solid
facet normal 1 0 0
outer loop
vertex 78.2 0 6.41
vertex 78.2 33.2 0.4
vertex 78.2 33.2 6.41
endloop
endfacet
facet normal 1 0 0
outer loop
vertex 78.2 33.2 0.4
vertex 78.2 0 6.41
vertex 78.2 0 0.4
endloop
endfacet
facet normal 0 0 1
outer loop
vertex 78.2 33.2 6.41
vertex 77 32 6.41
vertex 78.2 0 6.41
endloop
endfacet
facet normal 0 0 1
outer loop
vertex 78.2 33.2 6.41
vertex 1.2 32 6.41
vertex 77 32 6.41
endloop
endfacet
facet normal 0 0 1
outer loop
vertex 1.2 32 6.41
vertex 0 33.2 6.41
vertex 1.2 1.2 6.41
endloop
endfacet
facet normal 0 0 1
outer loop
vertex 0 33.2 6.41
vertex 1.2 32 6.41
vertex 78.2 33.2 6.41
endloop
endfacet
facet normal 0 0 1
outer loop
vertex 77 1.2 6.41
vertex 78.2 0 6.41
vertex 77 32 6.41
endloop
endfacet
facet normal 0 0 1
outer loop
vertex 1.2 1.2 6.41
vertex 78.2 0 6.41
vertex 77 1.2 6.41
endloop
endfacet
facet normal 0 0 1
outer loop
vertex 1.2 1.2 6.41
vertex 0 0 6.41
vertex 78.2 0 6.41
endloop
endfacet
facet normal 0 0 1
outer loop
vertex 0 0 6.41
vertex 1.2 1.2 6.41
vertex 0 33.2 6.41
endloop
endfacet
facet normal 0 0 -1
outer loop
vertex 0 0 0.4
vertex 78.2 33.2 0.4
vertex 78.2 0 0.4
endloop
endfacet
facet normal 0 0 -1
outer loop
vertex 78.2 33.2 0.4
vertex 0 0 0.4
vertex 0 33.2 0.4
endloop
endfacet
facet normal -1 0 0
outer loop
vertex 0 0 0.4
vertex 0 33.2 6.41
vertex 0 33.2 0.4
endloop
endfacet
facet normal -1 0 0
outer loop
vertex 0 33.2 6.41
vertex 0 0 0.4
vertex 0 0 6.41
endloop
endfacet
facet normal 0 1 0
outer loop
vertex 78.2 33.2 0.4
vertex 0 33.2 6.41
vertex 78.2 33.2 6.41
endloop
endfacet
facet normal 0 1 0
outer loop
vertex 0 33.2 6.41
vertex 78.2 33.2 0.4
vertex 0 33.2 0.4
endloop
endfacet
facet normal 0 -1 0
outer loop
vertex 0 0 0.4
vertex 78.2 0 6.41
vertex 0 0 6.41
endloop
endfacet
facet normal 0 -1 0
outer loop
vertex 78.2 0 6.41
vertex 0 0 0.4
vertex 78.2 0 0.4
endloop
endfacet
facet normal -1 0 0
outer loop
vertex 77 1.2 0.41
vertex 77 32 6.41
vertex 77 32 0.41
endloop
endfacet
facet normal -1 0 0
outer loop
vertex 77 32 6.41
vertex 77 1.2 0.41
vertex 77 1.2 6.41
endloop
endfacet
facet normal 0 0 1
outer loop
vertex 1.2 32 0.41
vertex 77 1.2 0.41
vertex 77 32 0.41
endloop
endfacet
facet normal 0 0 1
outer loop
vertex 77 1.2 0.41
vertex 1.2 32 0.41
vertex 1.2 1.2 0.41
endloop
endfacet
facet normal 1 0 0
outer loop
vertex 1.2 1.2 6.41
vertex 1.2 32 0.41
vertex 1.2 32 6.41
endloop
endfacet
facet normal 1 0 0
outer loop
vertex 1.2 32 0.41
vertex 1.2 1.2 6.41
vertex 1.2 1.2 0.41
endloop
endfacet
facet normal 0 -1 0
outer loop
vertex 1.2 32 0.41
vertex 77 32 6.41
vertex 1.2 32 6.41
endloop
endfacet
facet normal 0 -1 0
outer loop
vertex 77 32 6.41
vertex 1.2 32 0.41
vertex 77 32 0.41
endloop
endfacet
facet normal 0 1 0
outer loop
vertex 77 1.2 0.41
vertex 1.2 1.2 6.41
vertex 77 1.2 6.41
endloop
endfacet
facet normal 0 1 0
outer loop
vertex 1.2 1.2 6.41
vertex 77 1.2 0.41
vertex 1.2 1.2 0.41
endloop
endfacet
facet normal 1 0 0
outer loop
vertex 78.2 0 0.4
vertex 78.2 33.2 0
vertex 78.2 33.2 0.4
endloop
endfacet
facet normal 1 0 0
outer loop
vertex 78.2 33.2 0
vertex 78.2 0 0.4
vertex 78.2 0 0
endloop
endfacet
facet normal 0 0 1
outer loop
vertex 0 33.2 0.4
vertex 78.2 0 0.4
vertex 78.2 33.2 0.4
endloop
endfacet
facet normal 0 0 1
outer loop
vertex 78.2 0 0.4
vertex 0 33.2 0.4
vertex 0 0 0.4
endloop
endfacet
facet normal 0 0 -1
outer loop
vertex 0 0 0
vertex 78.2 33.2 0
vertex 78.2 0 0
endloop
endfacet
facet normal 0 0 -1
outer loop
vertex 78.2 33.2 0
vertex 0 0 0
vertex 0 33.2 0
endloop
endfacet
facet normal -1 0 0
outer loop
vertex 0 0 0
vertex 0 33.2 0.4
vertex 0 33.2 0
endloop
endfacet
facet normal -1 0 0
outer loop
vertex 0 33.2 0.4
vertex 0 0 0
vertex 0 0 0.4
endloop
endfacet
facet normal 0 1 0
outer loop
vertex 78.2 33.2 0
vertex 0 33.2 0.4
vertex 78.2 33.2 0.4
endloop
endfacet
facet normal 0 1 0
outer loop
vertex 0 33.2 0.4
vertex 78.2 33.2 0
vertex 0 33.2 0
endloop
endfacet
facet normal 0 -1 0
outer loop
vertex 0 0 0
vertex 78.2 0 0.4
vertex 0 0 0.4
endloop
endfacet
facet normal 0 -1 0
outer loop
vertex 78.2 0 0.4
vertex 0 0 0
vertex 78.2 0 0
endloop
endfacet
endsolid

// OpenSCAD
// file: ../../Base/Rotation.scad
// Fischertechnik Box Foundation
// Geometry Helpers Rotation

include <PlacementOptions.scad>

// getRotatedSpace(space, rotation=NoRotation)
// Rotates the space dependent on the specified rotation

function getRotatedSpace(space, rotation=NoRotation) = [
    (rotation == Rotate90 || rotation == Rotate270) ? space.y : space.x,
    (rotation == Rotate90 || rotation == Rotate270) ? space.x : space.y
];

// Rotates the given space around the fixed left lower corner
// space = the space the children needs as width/depth list [width,depth]
// rotation = 0 Rotate0 degrees, 1 Rotate90 degrees, 2 Rotate180 degrees, 3 Rotate270 degrees (equivalent to -90)

module RotateFix(space, rotation=NoRotation) {
    dy = (rotation == Rotate0 || rotation == Rotate270) ? 0 :
        (rotation == Rotate90) ? space.x :
        space.y;
    dx = (rotation < Rotate180) ? 0 :
        (rotation == Rotate180) ? space.x :
        space.y;
    
    translate([dx, dy, 0])
        rotate([0, 0, rotations[rotation]])
            children();
}
// file: ../../Base/Alignment.scad
// Fischertechnik Box Foundation
// Geometry Helpers Alignment

include <PlacementOptions.scad>

// getAlignedX(elementWidth, spaceWidth, align=AlignRight, offset=0)
// Gets the aligned X offset of an element with the given
// width in the given space.
// elementWidth = The width of the element to positon
// spaceWidth = The space where the element should be aligned
// align = 0 AlignLeft, 1 AlignCenter, 2 AlignRight
// offset = an optional offset from the aligned position. When
// aligned left or centered, then positive values are in X direction.
// When aligned right then positive values are in negative X direction.

function getAlignedX(elementWidth, spaceWidth, align=AlignRight, offset=0) =
    (align == AlignLeft) ?
        offset :
        ((align == AlignCenter) ?
        (spaceWidth - elementWidth)/2 + offset :
        spaceWidth - offset - elementWidth);

// getAlignedY(elementDepth, spaceDepth, align=AlignTop, offset=0)
// Gets the aligned Y offset of an element with the given
// depth in the given space.
// elementDepth = The depth of the element to positon
// spaceDepth = The space where the element should be aligned
// align = 0 AlignBottom, 1 AlignCenter, 2 AlignTop
// offset = an optional offset from the aligned position. When
// aligned bottom or centered, then positive values are in Y direction.
// When aligned top then positive values are in negative Y direction.

function getAlignedY(elementDepth, spaceDepth, align=AlignTop, offset=0) =
    (align == AlignBottom) ?
        offset :
        ((align == AlignCenter) ?
        (spaceDepth - elementDepth)/2 + offset :
        spaceDepth - offset - elementDepth);
// file: ../../Base/PlacementOptions.scad
// Fischertechnik Box Foundation
// Placement Options

// Alignment
NoAlign = 0;
AlignLeft = 1;
AlignBottom = 2;
AlignCenter = 3;
AlignRight = 4;
AlignTop = 5;

// Element rotation degree steps
rotations = [0, -90, -180, -270];

// Rotation
NoRotation = 0;
Rotate0 = 0;
Rotate90 = 1;
Rotate180 = 2;
Rotate270 = 3;

// Docking (seen from above)
NoDock = -1;
DockLeft = 0;
DockTop = 1;
DockRight = 2;
DockCorner = 2;
DockBottom = 3;

// Web corners
LowerLeft = 0;
UpperLeft = 1;
UpperRight = 2;
LowerRight = 3;

// Web position relative to corner
LeftOfCorner = 0;
RightOfCorner = 1;

// Rails direction
Horizontal = true;
Vertical = false;
// file: ../../Base/Boxes.scad
// Fischertechnik Box Foundation
// Pre-designed Boxes

use <Constants.scad>

include <PlacementOptions.scad>

box190Width = 190;
box190Depth = 130;
box130Width = 130;
box130Depth = 95;

// Values are from an original ec3 box
topBottomDifference = 1.5;
outerHeight = 40;
baseThickness = 1.8;
innerHeight = outerHeight - baseThickness;
stackExcess = 5.7;
radius = 3.5;
wallThickness = 1.5;
tolerance = 0.2;

boxWallThickness = wallThickness;
boxBaseThickness = baseThickness;
boxWebWidth = 3.0;

// getBoxWallThickness()
// Gets the wall thickness of a Fischertechnik Box
function getBoxWallThickness() = boxWallThickness;

// getBoxUsageHeight(height = 38.2)
// Gets the usable height of a Fischertechnik box
// height = Outer height of the box from the bottom to the upper edge.
function getBoxUsageHeight(height = outerHeight) = height - baseThickness - stackExcess;

// getBoxInnerHeight()
// Gets the inner height of a Fischertechnik box, including the stack excess
function getBoxInnerHeight() = innerHeight;

// getBoxBaseThickness()
// Gets the thickness of the Fischertechnik box base.
function getBoxBaseThickness() = boxBaseThickness;

// getBoxWebWidth()
// Gets the width of a box web
function getBoxWebWidth() = boxWebWidth;

// getBox190Space()
// Gets the usable inner space of a Box 190 as an x/y-list
function getBox190Space() = [
    box190Width - 2*getBoxWallThickness() - topBottomDifference, 
    box190Depth - 2*getBoxWallThickness() - topBottomDifference ];

// RoundedCornerPlate(width, depth, height, radius)
// Creates a body plate with rounded corners for a box. Used
// also to create the complete box with the hull module.
// width = Width of the plate
// depth = depth of the plate 
// height = thickness of the plate
// radius = radius of the rounded corner
module RoundedCornerPlate(width, depth, height, radius) {
    translate([radius, radius])
    hull() {
        w = width-2*radius;
        d = depth-2*radius;
        cube([w, d, height]);
        cylinder(height, r=radius, $fn=getFragments());
        translate([w, 0])
            cylinder(height, r=radius, $fn=getFragments());
        translate([w, d])
            cylinder(height, r=radius, $fn=getFragments());
        translate([0, d])
            cylinder(height, r=radius, $fn=getFragments());
    }
}

// BoxBase(width, depth)
// Creates an empty stackable Fischertechnik compatible box
// width = Outer width of the box (190, 130, ...)
// depth = Outer depth of the box (130, 95, ...)

module BoxBase(width, depth, height=outerHeight) {    
    thinPlate = 0.01;

    innerHeight = height - baseThickness;    
    
    module Body(tolerance=tolerance) {
        hull() {
            // Bottom with tolerance to fit into the original boxes when stacked
            translate([-wallThickness+tolerance, -wallThickness+tolerance, -baseThickness])
                RoundedCornerPlate(width-topBottomDifference-2*tolerance, depth-topBottomDifference-2*tolerance, thinPlate, radius);
            
            // Top
            translate([-wallThickness-topBottomDifference/2, -wallThickness-topBottomDifference/2, innerHeight-thinPlate])
                RoundedCornerPlate(width, depth, thinPlate, radius);
         }
    }

    module Cutoff() {
        hull() {
            coWidth = width - 2*wallThickness;
            coDepth = depth - 2*wallThickness;
            
            // Bottom
            RoundedCornerPlate(coWidth-topBottomDifference, coDepth-topBottomDifference, thinPlate, radius);

            // Top
            translate([-topBottomDifference/2, -topBottomDifference/2, innerHeight+thinPlate]) 
                RoundedCornerPlate(coWidth, coDepth, thinPlate, radius);
        }
    }
    
    difference() {        
        Body();
        Cutoff();
        stackOffset = innerHeight - stackExcess;
        translate([0, 0, stackOffset + baseThickness])
            Body(tolerance=0);
    }
}

// Creates the Fischertechnik empty box 130x190 mm and places it at position 0,0
// 190x130 are the outer sizes, the inner space is slightly smaller. Use getBox190Space() to get the inner sizes.
// The box is positioned that the usable inner space is at the 0,0,0 position.

module Box190() {
    BoxBase(box190Width, box190Depth);
}

// Gets the usable inner space of a Box 130 as an x/y-list
function getBox130Space() = [
    box130Width - 2*getBoxWallThickness() - topBottomDifference, 
    box130Depth - 2*getBoxWallThickness() - topBottomDifference ];

// Creates the Fischertechnik empty box 95x130 mm and places it at position 0,0
// 190x130 are the outer sizes, the inner space is slightly smaller. Use getBox190Space() to get the inner sizes.
// The box is positioned that the usable inner space is at the 0,0,0 position.

module Box130() {
    BoxBase(box130Width, box130Depth);
}

// Creates a web at the specified box walls
// corner 0 = LowerLeft, 1 = UpperLeft, 2 = UpperRight, 3 = LowerRight
// side 0 = LeftOfCorner, 1 = RightOfCorner
// distance = Distance in mm from the corner
// boxSpace = inner width and depth of the box (default: Box 190)
// webWidth = length of the web (default is 3 mms)
// webThickness = thickness of the web (default is 1 mm)
// height = Height of the web (standard is getBoxUsageHeight())
// sink = How much of the web is sunk into the wall

module BoxWeb(
    corner, 
    side, 
    distance, 
    boxSpace=getBox190Space(), 
    webWidth=getBoxWebWidth(), 
    webThickness=1.0, 
    height=getBoxUsageHeight(),
    sink = getBoxWallThickness()/2) {
    width = (corner % 2 == 0) ? 
            (side == LeftOfCorner ? webWidth : webThickness) :
            (side == LeftOfCorner ? webThickness : webWidth);

    depth = (corner % 2 == 0) ? 
            (side == RightOfCorner ? webWidth : webThickness) :
            (side == RightOfCorner ? webThickness : webWidth);
    
    xDiff = corner == LowerLeft ? 
                (side == LeftOfCorner ? -sink : distance) :
            (corner == UpperLeft ?                
                (side == LeftOfCorner ? distance : -sink) :
            (corner == UpperRight ?
                (side == LeftOfCorner ? boxSpace.x-webWidth+sink : boxSpace.x-distance-webThickness) :
                (side == LeftOfCorner ? boxSpace.x-distance-webThickness: boxSpace.x-webWidth+sink)));

    yDiff = corner == LowerLeft ? 
                (side == RightOfCorner ? -sink : distance) :
            (corner == UpperLeft ?
                (side == RightOfCorner ? boxSpace.y-distance-webThickness : boxSpace.y-webWidth+sink) :
            (corner == UpperRight ?
                (side == RightOfCorner ? boxSpace.y-webWidth+sink : boxSpace.y-distance-webThickness) :
                (side == RightOfCorner ? distance : -sink)));
    
    translate([xDiff, yDiff, -getExcess()])
        cube([width, depth, height + 2*getExcess()]);
}
// file: ../../Base/Placement.scad
// Fischertechnik Box Foundation
// Geometry Helpers Placement

use <Constants.scad>
use <Alignment.scad>
use <Rotation.scad>
use <Boxes.scad>

include <PlacementOptions.scad>

// Place(x=0, y=0, elementSpace=[0,0], alignX=AlignLeft, alignY=AlignBottom, rotation=Rotate0, boxSpace=getBox190Space())
// Places the child at the specified position
// y = Y-Position. This is a relative position when an X aligment is specified.
// x = X-Position. This is a relative position when an Y aligment is specified.
// elementSpace = space of the element to be placed [x,y]
// alignX = -1=NoAlign, 0 AlignLeft, 1 AlignCenter, 3 AlignRight (elementSpace and boxSpace required!)
// alignY = -1=NoAlign, 2 AlignBottom, 1 AlignCenter, 4 AlignTop (elementSpace and boxSpace required!)
// rotation = 0 Rotate0 0 degrees, 1 Rotate90 90 degrees, 
// 2 Rotate180 180 degrees, 3 Rotate270 270 degrees (equivalent to -90)
// boxSpace = Inner space of the box where the placement occurs [x,y] - default is Box 190x130 inner space

module Place(x=0, y=0, elementSpace=[0,0], 
  alignX=AlignLeft, alignY=AlignBottom, 
  rotation=NoRotation, boxSpace=getBox190Space()) {

    module Position(x, y, space, rotation=Rotate0) {
        translate([x, y, 0])
            RotateFix(space, rotation)
                children();
    }

    space = getRotatedSpace(elementSpace, rotation);
    alignedX = getAlignedX(space.x, boxSpace.x, alignX, x);
    alignedY = getAlignedY(space.y, boxSpace.y, alignY, y);
    Position(alignedX, alignedY, elementSpace, rotation)
        children();
}

// Center(space=getBox130Space(), elementSpace=[0,0])
// space = Space where the children is centered. For cylinder use centered=true and no elementSpace.
// elementSpace = space of the element to be centered [x,y]

module Center(space=getBox190Space(), elementSpace=[0,0]) {
    Place(elementSpace=elementSpace, boxSpace=space, alignX=AlignCenter, alignY=AlignCenter)
        children();
}

// CenterHorizontal(width=0, y=0, offset=0, space=getBox130Space())
// width = Width of the element to be placed.
// y = Y position of the element
// offset = Offset from the center position (negative will be left of the center)
// space = Space where the element is placed

module CenterHorizontal(width=0, y=0, offset=0, space=getBox190Space()) {
    Place(x=offset, y=y, elementSpace=[width, 0], boxSpace=space, alignX=AlignCenter)
        children(0);
}

// CenterVertical(depth=0, x=0, offset=0, space=getBox130Space())
// depth = Depth of the element to be placed.
// x = X position of the element
// offset = Offset from the center position (negative will be down of the center)
// space = Space where the element is placed

module CenterVertical(depth=0, x=0, offset=0, space=getBox190Space()) {
    Place(x=x, y=offset, elementSpace=[0, depth], boxSpace=space, alignY=AlignCenter)
        children(0);
}

// getIsVertical(align)
// True if the specified alignment needs a vertical orientation for a divider (AlignRight, AlignLeft)

function getIsVertical(align) = (align == AlignRight || align == AlignLeft);

// getIsHorizontal(align)
// True if the specified alignment needs a horizontal orientation for a divider (AlignTop, AlignBottom)

function getIsHorizontal(align) = (align == AlignTop || align == AlignBottom);
// file: ../../Elements/AxisClip10.scad
// Fischertechnik Box Library
// Axis for clip 10
// 31023

use <../ModelBase/Simple.scad>
use <../Base/Constants.scad>

/* [Element Parameters] */
height = 23;
clipHeight = 10;

/* [Hidden] */
width = 12;
depth = 12;
upperDiameter = 3.6;

// getAxisClip10Space()
// Gets the space of a n axis for a clip 10 with spring ring (mot2)

function getAxisClip10Space() = [width, depth, height];

// AxisClip10(height, clipHeight)
// Axis for clip 10 with spring ring (mot2)
// height = Height of the complete axis (standard is 23, in mot3 its only 12)
// clipHeight = Height of the part for the clip (standard is 10, in mot3 its only 7)

module AxisClip10(height=height, clipHeight=clipHeight) {
    LeveledAxisWithSpace(height, height-clipHeight, getAxisClip10Space(), diameter=upperDiameter);
}

// Test
color("lightgray")
AxisClip10(height, clipHeight);
// file: ../../Base/Constants.scad
// Fischertechnik Box Foundation
// Constants

// Constant values necessary for multiple elements

// Base constants
dividerThickness = 1.2;
excess = 0.01;
fragments = 90;
tolerance = 0.8;

// Gets the thickness of a divider 
function getDividerThickness() = dividerThickness;

// Gets the excess that is used to merge walls into each other
function getExcess() = excess;

// Gets amount of fragments of a cylinder
function getFragments() = fragments;

// Gets the inner tolerance of a frame to each side
function getTolerance() = tolerance;


// Fischertechnik specific constants
axisDiameter = 4;
axisBottomDiameter = axisDiameter + 1;
axisTolerance = 0.2;

// Gets axis diameter of Fischertechnik axis
function getAxisDiameter() = axisDiameter;

// Gets axis diameter tolerance (subtracted for element axis)
function getAxisTolerance() = axisTolerance;

// Gets the axis diameter for standing axis
function getStandAxisDiameter() = getAxisDiameter() - getAxisTolerance();

// Gets axis bottom diameter for thicker part at the bottom
function getAxisBottomDiameter() = axisBottomDiameter;

pinHeight = 2.5;
pinTolerance = 0.2;

// gets the height of a connecting pin
function getPinHeight() = pinHeight;

// gets the connecting pin height tolerance
function getPinTolerance() = pinTolerance;

standardEdgeDistance = 2.5;
standardWebDistance = 11.5;
standardCornerLength = 15;

// gets the standard distance to the wall of the box for dockable frames with webs
function getStandardEdgeDistance() = standardEdgeDistance;

// gets the standard distance of each web to the corner of the dockable frame
function getStandardWebDistance() = standardWebDistance;

// gets the standard length of the corner walls of a dockable frame
function getStandardCornerLength() = standardCornerLength;

tubeWallFactor = 0.8;

// gets the wall thickness of a tube.
function getTubeWallThickness() = tubeWallFactor * getDividerThickness();

smallPartsFrameHeight = 20;

// gets the frame height for docked small parts boxes.
function getSmallPartsFrameHeight() = smallPartsFrameHeight;

hubRingDiameter = 19.5;
hubRingLevelDiameter = 21;

// gets the diameter of a tube matching the inner ring of a wheel
function getHubRingDiameter() = hubRingDiameter;

// gets the diameter of a hub tube with a thicker diameter
function getHubRingLevelDiameter() = hubRingLevelDiameter;
// file: ../../Elements/Frame9VBatterySet.scad
// Fischertechnik Box Library
// Frame for 9V block battery set with switch
// 135719

use <../ModelBase/Simple.scad>

/* [Hidden] */
width = 75;
depth = 30;
height = 6;
volume = [width, depth, height];

// getFrame9VBatterySetSpace(columns=1, rows=1)
// Gets the space of a frame for columns x rows small parts (7.5 or 5)

function getFrame9VBatterySetSpace() = getFrameOuterVolume(volume);

// Frame9VBatterySet()
// Frame for 9V block battery set with switch

module Frame9VBatterySet() {
    Frame(volume);
}

// Tests
color("lightgray")
Frame9VBatterySet();
// file: ../TestPrint.scad
// 3D Print Test Base

use <../Base/Constants.scad>

use <../Elements/AxisClip10.scad>

module TestPrint(elementSpace) {
    cube([elementSpace.x, elementSpace.y, 0.4]);
    translate([0,0,0.4+getExcess()]) {
        children();
    }
}

TestPrint(getAxisClip10Space())
    AxisClip10();
// main file
// 3D Print Test
// Frame9VBatterySet

use <../TestPrint.scad>
use <../../Elements/Frame9VBatterySet.scad>

TestPrint(getFrame9VBatterySetSpace())
    Frame9VBatterySet();
